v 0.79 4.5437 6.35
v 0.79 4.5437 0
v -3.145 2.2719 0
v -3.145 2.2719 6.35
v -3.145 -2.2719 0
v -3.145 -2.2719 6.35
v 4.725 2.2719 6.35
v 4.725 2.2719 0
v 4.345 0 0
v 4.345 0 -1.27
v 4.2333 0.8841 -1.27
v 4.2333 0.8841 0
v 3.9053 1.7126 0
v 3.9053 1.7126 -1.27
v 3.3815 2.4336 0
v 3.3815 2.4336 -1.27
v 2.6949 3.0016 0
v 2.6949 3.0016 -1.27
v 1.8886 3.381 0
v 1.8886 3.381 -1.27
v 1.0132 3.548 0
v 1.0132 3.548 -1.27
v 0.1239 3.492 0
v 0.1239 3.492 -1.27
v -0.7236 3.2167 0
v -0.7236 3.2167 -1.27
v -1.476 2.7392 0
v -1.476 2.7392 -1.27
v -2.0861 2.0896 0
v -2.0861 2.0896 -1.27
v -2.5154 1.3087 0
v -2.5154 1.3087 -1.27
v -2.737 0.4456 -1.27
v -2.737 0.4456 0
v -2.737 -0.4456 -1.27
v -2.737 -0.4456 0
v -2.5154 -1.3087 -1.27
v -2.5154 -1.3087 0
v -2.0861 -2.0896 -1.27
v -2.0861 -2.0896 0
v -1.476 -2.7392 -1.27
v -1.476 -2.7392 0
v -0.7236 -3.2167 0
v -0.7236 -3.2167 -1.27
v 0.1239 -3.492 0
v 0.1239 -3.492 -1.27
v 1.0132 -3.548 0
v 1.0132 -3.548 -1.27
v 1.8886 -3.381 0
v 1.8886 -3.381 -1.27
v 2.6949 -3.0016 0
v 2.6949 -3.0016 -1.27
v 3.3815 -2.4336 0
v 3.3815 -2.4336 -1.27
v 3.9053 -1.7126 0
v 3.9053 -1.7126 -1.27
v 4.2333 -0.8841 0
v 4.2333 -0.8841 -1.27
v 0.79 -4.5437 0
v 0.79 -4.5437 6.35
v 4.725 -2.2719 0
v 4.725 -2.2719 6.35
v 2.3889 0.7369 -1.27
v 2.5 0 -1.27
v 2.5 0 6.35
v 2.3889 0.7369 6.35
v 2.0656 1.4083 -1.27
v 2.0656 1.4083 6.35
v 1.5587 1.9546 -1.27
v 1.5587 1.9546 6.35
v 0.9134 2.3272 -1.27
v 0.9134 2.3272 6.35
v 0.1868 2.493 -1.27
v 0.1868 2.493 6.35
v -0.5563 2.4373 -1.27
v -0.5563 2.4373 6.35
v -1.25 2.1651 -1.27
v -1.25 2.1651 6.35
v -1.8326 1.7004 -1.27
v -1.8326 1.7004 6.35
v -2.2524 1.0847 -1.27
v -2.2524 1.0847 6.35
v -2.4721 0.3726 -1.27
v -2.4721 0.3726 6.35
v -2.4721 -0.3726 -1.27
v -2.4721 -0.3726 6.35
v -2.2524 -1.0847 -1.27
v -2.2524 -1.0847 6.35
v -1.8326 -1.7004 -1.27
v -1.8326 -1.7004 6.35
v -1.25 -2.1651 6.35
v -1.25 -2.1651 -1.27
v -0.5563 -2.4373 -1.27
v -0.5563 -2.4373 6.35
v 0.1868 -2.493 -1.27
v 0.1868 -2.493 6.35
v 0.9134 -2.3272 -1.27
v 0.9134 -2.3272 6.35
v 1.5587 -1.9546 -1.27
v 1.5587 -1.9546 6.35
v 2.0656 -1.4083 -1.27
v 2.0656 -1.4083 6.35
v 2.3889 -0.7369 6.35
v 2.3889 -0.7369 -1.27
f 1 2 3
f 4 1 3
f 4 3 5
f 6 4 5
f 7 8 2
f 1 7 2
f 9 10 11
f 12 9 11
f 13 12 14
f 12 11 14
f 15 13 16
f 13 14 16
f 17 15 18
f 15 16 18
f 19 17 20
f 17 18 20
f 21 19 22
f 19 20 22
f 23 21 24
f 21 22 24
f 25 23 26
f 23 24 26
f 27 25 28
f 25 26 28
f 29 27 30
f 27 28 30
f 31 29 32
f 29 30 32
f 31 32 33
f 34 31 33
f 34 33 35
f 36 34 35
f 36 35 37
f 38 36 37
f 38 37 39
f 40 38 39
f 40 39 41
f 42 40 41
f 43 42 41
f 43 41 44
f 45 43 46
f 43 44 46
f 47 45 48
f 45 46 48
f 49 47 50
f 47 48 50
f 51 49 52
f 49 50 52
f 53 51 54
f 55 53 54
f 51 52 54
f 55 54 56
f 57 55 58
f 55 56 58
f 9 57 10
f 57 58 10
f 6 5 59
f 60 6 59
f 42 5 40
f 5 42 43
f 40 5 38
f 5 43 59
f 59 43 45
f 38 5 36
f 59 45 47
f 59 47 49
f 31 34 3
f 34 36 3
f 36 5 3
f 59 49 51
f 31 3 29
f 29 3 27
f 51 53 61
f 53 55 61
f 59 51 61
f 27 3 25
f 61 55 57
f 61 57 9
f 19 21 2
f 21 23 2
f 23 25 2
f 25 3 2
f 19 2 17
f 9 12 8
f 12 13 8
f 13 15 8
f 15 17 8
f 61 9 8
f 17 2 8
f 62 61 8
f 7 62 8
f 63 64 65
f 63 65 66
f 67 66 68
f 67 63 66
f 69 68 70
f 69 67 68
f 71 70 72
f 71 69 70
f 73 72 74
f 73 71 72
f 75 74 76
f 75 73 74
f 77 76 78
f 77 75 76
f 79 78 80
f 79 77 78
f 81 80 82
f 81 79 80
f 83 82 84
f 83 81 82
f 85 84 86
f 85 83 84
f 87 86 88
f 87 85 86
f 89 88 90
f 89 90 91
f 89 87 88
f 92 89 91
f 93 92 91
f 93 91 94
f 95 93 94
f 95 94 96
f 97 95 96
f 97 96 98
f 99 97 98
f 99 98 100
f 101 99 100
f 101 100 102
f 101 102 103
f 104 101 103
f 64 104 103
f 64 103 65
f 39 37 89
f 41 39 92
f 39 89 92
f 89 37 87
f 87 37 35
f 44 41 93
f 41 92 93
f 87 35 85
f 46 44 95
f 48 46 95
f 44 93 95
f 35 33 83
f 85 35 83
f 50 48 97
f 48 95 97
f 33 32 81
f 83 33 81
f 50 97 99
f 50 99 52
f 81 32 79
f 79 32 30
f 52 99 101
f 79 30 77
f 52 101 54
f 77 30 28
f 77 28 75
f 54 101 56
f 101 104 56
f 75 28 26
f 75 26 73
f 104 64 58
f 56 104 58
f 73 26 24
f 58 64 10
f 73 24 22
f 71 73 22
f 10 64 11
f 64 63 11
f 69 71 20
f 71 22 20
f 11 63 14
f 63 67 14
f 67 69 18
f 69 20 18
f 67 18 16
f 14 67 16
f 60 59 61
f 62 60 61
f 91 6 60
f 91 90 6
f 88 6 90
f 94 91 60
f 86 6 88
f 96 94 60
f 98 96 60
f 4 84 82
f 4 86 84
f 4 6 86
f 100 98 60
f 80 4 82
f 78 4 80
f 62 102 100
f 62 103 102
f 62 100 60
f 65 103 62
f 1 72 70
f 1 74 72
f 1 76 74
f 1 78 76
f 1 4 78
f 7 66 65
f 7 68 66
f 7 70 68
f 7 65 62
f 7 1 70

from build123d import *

# Parameters (mm, degrees)
SKETCH1_R           = 2.5
BOSS_EXTRUDE3_DEPTH = 6.35
BOSS_EXTRUDE4_START = -1.27
SKETCH1_5_R         = 3.555
SKETCH1_5_R_2       = 2.5
BOSS_EXTRUDE4_DEPTH = 1.27


with BuildPart() as part:
    # Sketch1 → Boss-Extrude3 (new body)
    with BuildSketch(Plane.XY):
        Polygon((4.725, 2.271873309), (0.79, 4.543746619), (-3.145, 2.271873309), (-3.145, -2.271873309), (0.79, -4.543746619), (4.725, -2.271873309), align=None)
        Circle(SKETCH1_R, mode=Mode.SUBTRACT)
    extrude(amount=BOSS_EXTRUDE3_DEPTH)

    # Sketch1<5> → Boss-Extrude4 (add)
    with BuildSketch(Plane.XY.offset(BOSS_EXTRUDE4_START)):
        with Locations((0.79, 0)):
            Circle(SKETCH1_5_R)
        Circle(SKETCH1_5_R_2, mode=Mode.SUBTRACT)
    extrude(amount=BOSS_EXTRUDE4_DEPTH)


solid = part.part
